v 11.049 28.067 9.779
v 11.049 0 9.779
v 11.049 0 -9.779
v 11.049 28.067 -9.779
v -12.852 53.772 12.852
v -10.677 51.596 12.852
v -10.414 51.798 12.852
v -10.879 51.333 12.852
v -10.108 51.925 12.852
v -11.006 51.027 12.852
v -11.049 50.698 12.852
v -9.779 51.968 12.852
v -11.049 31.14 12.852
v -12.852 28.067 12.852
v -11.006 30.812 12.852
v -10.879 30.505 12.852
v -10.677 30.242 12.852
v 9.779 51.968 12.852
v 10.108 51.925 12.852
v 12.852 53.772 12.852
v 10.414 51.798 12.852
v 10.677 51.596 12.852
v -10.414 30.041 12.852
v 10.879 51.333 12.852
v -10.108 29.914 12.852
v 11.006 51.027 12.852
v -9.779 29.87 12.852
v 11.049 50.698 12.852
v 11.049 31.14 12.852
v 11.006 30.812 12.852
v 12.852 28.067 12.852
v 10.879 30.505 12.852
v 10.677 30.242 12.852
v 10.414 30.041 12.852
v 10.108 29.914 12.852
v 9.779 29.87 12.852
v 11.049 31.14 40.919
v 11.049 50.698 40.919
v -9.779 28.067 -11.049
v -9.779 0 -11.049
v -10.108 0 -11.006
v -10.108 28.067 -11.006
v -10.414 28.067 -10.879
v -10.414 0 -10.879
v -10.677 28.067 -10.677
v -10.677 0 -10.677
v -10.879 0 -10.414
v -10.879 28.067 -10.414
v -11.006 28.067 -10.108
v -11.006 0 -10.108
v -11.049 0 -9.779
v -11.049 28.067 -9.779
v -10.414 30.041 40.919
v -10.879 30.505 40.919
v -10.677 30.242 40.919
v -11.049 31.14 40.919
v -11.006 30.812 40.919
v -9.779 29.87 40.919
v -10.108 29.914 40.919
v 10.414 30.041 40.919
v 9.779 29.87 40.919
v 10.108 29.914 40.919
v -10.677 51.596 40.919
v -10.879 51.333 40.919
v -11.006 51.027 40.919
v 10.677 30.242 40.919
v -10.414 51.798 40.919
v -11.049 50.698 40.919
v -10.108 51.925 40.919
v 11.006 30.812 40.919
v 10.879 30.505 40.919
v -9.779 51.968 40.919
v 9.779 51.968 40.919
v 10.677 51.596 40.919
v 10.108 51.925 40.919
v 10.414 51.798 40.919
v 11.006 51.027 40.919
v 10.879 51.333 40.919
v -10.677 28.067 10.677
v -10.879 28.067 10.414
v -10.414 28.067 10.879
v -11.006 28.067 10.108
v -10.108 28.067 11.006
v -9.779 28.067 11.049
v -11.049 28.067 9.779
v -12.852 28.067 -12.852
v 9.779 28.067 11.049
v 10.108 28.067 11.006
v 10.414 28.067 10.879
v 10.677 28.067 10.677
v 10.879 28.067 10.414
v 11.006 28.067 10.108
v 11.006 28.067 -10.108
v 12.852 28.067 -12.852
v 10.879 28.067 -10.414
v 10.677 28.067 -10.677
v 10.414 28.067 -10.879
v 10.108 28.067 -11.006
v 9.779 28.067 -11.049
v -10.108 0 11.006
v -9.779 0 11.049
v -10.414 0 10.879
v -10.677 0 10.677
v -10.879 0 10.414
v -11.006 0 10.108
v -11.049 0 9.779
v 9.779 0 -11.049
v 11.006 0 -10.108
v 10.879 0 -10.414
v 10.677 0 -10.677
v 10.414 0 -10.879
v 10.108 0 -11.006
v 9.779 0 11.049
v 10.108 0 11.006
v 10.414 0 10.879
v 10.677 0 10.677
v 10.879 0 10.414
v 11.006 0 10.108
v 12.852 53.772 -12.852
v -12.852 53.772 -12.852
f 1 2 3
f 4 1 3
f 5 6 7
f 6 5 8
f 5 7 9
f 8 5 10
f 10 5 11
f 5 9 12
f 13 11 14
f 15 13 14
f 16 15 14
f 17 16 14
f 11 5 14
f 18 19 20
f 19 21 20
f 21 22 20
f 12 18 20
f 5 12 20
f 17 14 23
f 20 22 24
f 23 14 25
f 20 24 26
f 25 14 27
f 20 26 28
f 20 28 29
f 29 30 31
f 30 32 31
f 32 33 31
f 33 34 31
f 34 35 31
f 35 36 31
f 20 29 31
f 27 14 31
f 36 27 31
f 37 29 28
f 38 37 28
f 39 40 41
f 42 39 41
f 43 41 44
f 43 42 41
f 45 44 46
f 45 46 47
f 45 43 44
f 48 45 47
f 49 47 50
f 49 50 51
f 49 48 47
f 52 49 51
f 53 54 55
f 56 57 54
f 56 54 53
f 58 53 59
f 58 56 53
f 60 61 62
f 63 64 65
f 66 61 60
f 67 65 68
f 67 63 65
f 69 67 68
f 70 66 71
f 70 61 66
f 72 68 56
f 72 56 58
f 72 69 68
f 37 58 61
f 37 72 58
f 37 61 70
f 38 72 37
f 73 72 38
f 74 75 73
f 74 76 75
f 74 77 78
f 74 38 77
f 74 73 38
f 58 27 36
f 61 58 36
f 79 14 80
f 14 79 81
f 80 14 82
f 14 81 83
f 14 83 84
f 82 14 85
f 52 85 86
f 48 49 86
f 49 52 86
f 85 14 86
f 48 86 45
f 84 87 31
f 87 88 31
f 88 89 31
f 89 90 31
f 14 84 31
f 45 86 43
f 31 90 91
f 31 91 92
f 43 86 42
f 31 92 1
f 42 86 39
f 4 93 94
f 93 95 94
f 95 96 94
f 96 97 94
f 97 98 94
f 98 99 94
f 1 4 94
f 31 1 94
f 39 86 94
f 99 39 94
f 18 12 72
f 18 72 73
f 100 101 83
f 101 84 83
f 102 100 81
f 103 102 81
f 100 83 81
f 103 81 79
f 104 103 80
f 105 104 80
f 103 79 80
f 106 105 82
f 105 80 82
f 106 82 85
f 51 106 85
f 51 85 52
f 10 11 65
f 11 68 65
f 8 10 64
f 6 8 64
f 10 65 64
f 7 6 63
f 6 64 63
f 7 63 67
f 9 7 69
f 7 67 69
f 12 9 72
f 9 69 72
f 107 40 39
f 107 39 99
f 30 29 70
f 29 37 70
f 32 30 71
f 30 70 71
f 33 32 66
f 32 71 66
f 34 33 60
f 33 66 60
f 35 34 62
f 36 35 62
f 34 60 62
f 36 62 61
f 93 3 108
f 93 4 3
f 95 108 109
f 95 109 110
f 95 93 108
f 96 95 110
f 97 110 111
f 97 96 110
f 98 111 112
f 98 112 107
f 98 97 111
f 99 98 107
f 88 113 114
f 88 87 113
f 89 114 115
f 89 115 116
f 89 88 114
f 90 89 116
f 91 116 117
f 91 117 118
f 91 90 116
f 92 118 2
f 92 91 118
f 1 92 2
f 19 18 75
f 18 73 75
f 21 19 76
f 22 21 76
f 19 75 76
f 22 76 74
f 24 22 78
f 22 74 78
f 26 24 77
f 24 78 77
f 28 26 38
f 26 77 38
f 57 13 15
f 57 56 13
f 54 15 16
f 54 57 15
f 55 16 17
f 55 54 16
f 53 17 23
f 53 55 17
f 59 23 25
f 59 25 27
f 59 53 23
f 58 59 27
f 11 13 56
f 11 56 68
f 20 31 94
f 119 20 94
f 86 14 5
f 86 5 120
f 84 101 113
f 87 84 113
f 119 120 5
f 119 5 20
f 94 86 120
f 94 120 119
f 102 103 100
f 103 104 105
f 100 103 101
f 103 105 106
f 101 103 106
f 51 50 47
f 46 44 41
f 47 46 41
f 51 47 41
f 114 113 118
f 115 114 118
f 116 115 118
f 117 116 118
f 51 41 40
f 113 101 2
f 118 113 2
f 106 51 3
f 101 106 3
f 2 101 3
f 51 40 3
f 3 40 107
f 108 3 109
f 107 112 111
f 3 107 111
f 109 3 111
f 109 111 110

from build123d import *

# Parameters (mm, degrees)
SKETCH1_W           = 22.098
SKETCH1_H           = 22.098
BOSS_EXTRUDE1_DEPTH = 28.067
SKETCH2_W           = 25.7048
SKETCH2_H           = 25.7048
BOSS_EXTRUDE2_DEPTH = 25.7048
SKETCH3_W           = 22.098
SKETCH3_H           = 22.098
BOSS_EXTRUDE3_DEPTH = 28.067
FILLET1_R           = 1.27


with BuildPart() as part:
    # Sketch1 → Boss-Extrude1 (new body)
    with BuildSketch(Plane(origin=(0, 0, 0), x_dir=(1, 0, 0), z_dir=(0, 1, 0))):
        Rectangle(SKETCH1_W, SKETCH1_H)
    extrude(amount=BOSS_EXTRUDE1_DEPTH)

    # Sketch2 → Boss-Extrude2 (add)
    with BuildSketch(Plane(origin=(0, 28.067, 0), x_dir=(1, 0, 0), z_dir=(0, 1, 0))):
        Rectangle(SKETCH2_W, SKETCH2_H)
    extrude(amount=BOSS_EXTRUDE2_DEPTH)

    # Sketch3 → Boss-Extrude3 (add)
    with BuildSketch(Plane.XY.offset(12.8524)):
        with Locations((0, 40.9194)):
            Rectangle(SKETCH3_W, SKETCH3_H)
    extrude(amount=BOSS_EXTRUDE3_DEPTH)

    # Fillet1
    fillet1_edges = [part.edges().sort_by_distance(p)[0] for p in [
        (11.049, 29.8704, 26.8859),
        (11.049, 51.9684, 26.8859),
        (-11.049, 51.9684, 26.8859),
        (-11.049, 29.8704, 26.8859),
        (11.049, 14.0335, 11.049),
        (-11.049, 14.0335, 11.049),
        (-11.049, 14.0335, -11.049),
        (11.049, 14.0335, -11.049),
    ]]
    fillet(fillet1_edges, radius=FILLET1_R)


solid = part.part
